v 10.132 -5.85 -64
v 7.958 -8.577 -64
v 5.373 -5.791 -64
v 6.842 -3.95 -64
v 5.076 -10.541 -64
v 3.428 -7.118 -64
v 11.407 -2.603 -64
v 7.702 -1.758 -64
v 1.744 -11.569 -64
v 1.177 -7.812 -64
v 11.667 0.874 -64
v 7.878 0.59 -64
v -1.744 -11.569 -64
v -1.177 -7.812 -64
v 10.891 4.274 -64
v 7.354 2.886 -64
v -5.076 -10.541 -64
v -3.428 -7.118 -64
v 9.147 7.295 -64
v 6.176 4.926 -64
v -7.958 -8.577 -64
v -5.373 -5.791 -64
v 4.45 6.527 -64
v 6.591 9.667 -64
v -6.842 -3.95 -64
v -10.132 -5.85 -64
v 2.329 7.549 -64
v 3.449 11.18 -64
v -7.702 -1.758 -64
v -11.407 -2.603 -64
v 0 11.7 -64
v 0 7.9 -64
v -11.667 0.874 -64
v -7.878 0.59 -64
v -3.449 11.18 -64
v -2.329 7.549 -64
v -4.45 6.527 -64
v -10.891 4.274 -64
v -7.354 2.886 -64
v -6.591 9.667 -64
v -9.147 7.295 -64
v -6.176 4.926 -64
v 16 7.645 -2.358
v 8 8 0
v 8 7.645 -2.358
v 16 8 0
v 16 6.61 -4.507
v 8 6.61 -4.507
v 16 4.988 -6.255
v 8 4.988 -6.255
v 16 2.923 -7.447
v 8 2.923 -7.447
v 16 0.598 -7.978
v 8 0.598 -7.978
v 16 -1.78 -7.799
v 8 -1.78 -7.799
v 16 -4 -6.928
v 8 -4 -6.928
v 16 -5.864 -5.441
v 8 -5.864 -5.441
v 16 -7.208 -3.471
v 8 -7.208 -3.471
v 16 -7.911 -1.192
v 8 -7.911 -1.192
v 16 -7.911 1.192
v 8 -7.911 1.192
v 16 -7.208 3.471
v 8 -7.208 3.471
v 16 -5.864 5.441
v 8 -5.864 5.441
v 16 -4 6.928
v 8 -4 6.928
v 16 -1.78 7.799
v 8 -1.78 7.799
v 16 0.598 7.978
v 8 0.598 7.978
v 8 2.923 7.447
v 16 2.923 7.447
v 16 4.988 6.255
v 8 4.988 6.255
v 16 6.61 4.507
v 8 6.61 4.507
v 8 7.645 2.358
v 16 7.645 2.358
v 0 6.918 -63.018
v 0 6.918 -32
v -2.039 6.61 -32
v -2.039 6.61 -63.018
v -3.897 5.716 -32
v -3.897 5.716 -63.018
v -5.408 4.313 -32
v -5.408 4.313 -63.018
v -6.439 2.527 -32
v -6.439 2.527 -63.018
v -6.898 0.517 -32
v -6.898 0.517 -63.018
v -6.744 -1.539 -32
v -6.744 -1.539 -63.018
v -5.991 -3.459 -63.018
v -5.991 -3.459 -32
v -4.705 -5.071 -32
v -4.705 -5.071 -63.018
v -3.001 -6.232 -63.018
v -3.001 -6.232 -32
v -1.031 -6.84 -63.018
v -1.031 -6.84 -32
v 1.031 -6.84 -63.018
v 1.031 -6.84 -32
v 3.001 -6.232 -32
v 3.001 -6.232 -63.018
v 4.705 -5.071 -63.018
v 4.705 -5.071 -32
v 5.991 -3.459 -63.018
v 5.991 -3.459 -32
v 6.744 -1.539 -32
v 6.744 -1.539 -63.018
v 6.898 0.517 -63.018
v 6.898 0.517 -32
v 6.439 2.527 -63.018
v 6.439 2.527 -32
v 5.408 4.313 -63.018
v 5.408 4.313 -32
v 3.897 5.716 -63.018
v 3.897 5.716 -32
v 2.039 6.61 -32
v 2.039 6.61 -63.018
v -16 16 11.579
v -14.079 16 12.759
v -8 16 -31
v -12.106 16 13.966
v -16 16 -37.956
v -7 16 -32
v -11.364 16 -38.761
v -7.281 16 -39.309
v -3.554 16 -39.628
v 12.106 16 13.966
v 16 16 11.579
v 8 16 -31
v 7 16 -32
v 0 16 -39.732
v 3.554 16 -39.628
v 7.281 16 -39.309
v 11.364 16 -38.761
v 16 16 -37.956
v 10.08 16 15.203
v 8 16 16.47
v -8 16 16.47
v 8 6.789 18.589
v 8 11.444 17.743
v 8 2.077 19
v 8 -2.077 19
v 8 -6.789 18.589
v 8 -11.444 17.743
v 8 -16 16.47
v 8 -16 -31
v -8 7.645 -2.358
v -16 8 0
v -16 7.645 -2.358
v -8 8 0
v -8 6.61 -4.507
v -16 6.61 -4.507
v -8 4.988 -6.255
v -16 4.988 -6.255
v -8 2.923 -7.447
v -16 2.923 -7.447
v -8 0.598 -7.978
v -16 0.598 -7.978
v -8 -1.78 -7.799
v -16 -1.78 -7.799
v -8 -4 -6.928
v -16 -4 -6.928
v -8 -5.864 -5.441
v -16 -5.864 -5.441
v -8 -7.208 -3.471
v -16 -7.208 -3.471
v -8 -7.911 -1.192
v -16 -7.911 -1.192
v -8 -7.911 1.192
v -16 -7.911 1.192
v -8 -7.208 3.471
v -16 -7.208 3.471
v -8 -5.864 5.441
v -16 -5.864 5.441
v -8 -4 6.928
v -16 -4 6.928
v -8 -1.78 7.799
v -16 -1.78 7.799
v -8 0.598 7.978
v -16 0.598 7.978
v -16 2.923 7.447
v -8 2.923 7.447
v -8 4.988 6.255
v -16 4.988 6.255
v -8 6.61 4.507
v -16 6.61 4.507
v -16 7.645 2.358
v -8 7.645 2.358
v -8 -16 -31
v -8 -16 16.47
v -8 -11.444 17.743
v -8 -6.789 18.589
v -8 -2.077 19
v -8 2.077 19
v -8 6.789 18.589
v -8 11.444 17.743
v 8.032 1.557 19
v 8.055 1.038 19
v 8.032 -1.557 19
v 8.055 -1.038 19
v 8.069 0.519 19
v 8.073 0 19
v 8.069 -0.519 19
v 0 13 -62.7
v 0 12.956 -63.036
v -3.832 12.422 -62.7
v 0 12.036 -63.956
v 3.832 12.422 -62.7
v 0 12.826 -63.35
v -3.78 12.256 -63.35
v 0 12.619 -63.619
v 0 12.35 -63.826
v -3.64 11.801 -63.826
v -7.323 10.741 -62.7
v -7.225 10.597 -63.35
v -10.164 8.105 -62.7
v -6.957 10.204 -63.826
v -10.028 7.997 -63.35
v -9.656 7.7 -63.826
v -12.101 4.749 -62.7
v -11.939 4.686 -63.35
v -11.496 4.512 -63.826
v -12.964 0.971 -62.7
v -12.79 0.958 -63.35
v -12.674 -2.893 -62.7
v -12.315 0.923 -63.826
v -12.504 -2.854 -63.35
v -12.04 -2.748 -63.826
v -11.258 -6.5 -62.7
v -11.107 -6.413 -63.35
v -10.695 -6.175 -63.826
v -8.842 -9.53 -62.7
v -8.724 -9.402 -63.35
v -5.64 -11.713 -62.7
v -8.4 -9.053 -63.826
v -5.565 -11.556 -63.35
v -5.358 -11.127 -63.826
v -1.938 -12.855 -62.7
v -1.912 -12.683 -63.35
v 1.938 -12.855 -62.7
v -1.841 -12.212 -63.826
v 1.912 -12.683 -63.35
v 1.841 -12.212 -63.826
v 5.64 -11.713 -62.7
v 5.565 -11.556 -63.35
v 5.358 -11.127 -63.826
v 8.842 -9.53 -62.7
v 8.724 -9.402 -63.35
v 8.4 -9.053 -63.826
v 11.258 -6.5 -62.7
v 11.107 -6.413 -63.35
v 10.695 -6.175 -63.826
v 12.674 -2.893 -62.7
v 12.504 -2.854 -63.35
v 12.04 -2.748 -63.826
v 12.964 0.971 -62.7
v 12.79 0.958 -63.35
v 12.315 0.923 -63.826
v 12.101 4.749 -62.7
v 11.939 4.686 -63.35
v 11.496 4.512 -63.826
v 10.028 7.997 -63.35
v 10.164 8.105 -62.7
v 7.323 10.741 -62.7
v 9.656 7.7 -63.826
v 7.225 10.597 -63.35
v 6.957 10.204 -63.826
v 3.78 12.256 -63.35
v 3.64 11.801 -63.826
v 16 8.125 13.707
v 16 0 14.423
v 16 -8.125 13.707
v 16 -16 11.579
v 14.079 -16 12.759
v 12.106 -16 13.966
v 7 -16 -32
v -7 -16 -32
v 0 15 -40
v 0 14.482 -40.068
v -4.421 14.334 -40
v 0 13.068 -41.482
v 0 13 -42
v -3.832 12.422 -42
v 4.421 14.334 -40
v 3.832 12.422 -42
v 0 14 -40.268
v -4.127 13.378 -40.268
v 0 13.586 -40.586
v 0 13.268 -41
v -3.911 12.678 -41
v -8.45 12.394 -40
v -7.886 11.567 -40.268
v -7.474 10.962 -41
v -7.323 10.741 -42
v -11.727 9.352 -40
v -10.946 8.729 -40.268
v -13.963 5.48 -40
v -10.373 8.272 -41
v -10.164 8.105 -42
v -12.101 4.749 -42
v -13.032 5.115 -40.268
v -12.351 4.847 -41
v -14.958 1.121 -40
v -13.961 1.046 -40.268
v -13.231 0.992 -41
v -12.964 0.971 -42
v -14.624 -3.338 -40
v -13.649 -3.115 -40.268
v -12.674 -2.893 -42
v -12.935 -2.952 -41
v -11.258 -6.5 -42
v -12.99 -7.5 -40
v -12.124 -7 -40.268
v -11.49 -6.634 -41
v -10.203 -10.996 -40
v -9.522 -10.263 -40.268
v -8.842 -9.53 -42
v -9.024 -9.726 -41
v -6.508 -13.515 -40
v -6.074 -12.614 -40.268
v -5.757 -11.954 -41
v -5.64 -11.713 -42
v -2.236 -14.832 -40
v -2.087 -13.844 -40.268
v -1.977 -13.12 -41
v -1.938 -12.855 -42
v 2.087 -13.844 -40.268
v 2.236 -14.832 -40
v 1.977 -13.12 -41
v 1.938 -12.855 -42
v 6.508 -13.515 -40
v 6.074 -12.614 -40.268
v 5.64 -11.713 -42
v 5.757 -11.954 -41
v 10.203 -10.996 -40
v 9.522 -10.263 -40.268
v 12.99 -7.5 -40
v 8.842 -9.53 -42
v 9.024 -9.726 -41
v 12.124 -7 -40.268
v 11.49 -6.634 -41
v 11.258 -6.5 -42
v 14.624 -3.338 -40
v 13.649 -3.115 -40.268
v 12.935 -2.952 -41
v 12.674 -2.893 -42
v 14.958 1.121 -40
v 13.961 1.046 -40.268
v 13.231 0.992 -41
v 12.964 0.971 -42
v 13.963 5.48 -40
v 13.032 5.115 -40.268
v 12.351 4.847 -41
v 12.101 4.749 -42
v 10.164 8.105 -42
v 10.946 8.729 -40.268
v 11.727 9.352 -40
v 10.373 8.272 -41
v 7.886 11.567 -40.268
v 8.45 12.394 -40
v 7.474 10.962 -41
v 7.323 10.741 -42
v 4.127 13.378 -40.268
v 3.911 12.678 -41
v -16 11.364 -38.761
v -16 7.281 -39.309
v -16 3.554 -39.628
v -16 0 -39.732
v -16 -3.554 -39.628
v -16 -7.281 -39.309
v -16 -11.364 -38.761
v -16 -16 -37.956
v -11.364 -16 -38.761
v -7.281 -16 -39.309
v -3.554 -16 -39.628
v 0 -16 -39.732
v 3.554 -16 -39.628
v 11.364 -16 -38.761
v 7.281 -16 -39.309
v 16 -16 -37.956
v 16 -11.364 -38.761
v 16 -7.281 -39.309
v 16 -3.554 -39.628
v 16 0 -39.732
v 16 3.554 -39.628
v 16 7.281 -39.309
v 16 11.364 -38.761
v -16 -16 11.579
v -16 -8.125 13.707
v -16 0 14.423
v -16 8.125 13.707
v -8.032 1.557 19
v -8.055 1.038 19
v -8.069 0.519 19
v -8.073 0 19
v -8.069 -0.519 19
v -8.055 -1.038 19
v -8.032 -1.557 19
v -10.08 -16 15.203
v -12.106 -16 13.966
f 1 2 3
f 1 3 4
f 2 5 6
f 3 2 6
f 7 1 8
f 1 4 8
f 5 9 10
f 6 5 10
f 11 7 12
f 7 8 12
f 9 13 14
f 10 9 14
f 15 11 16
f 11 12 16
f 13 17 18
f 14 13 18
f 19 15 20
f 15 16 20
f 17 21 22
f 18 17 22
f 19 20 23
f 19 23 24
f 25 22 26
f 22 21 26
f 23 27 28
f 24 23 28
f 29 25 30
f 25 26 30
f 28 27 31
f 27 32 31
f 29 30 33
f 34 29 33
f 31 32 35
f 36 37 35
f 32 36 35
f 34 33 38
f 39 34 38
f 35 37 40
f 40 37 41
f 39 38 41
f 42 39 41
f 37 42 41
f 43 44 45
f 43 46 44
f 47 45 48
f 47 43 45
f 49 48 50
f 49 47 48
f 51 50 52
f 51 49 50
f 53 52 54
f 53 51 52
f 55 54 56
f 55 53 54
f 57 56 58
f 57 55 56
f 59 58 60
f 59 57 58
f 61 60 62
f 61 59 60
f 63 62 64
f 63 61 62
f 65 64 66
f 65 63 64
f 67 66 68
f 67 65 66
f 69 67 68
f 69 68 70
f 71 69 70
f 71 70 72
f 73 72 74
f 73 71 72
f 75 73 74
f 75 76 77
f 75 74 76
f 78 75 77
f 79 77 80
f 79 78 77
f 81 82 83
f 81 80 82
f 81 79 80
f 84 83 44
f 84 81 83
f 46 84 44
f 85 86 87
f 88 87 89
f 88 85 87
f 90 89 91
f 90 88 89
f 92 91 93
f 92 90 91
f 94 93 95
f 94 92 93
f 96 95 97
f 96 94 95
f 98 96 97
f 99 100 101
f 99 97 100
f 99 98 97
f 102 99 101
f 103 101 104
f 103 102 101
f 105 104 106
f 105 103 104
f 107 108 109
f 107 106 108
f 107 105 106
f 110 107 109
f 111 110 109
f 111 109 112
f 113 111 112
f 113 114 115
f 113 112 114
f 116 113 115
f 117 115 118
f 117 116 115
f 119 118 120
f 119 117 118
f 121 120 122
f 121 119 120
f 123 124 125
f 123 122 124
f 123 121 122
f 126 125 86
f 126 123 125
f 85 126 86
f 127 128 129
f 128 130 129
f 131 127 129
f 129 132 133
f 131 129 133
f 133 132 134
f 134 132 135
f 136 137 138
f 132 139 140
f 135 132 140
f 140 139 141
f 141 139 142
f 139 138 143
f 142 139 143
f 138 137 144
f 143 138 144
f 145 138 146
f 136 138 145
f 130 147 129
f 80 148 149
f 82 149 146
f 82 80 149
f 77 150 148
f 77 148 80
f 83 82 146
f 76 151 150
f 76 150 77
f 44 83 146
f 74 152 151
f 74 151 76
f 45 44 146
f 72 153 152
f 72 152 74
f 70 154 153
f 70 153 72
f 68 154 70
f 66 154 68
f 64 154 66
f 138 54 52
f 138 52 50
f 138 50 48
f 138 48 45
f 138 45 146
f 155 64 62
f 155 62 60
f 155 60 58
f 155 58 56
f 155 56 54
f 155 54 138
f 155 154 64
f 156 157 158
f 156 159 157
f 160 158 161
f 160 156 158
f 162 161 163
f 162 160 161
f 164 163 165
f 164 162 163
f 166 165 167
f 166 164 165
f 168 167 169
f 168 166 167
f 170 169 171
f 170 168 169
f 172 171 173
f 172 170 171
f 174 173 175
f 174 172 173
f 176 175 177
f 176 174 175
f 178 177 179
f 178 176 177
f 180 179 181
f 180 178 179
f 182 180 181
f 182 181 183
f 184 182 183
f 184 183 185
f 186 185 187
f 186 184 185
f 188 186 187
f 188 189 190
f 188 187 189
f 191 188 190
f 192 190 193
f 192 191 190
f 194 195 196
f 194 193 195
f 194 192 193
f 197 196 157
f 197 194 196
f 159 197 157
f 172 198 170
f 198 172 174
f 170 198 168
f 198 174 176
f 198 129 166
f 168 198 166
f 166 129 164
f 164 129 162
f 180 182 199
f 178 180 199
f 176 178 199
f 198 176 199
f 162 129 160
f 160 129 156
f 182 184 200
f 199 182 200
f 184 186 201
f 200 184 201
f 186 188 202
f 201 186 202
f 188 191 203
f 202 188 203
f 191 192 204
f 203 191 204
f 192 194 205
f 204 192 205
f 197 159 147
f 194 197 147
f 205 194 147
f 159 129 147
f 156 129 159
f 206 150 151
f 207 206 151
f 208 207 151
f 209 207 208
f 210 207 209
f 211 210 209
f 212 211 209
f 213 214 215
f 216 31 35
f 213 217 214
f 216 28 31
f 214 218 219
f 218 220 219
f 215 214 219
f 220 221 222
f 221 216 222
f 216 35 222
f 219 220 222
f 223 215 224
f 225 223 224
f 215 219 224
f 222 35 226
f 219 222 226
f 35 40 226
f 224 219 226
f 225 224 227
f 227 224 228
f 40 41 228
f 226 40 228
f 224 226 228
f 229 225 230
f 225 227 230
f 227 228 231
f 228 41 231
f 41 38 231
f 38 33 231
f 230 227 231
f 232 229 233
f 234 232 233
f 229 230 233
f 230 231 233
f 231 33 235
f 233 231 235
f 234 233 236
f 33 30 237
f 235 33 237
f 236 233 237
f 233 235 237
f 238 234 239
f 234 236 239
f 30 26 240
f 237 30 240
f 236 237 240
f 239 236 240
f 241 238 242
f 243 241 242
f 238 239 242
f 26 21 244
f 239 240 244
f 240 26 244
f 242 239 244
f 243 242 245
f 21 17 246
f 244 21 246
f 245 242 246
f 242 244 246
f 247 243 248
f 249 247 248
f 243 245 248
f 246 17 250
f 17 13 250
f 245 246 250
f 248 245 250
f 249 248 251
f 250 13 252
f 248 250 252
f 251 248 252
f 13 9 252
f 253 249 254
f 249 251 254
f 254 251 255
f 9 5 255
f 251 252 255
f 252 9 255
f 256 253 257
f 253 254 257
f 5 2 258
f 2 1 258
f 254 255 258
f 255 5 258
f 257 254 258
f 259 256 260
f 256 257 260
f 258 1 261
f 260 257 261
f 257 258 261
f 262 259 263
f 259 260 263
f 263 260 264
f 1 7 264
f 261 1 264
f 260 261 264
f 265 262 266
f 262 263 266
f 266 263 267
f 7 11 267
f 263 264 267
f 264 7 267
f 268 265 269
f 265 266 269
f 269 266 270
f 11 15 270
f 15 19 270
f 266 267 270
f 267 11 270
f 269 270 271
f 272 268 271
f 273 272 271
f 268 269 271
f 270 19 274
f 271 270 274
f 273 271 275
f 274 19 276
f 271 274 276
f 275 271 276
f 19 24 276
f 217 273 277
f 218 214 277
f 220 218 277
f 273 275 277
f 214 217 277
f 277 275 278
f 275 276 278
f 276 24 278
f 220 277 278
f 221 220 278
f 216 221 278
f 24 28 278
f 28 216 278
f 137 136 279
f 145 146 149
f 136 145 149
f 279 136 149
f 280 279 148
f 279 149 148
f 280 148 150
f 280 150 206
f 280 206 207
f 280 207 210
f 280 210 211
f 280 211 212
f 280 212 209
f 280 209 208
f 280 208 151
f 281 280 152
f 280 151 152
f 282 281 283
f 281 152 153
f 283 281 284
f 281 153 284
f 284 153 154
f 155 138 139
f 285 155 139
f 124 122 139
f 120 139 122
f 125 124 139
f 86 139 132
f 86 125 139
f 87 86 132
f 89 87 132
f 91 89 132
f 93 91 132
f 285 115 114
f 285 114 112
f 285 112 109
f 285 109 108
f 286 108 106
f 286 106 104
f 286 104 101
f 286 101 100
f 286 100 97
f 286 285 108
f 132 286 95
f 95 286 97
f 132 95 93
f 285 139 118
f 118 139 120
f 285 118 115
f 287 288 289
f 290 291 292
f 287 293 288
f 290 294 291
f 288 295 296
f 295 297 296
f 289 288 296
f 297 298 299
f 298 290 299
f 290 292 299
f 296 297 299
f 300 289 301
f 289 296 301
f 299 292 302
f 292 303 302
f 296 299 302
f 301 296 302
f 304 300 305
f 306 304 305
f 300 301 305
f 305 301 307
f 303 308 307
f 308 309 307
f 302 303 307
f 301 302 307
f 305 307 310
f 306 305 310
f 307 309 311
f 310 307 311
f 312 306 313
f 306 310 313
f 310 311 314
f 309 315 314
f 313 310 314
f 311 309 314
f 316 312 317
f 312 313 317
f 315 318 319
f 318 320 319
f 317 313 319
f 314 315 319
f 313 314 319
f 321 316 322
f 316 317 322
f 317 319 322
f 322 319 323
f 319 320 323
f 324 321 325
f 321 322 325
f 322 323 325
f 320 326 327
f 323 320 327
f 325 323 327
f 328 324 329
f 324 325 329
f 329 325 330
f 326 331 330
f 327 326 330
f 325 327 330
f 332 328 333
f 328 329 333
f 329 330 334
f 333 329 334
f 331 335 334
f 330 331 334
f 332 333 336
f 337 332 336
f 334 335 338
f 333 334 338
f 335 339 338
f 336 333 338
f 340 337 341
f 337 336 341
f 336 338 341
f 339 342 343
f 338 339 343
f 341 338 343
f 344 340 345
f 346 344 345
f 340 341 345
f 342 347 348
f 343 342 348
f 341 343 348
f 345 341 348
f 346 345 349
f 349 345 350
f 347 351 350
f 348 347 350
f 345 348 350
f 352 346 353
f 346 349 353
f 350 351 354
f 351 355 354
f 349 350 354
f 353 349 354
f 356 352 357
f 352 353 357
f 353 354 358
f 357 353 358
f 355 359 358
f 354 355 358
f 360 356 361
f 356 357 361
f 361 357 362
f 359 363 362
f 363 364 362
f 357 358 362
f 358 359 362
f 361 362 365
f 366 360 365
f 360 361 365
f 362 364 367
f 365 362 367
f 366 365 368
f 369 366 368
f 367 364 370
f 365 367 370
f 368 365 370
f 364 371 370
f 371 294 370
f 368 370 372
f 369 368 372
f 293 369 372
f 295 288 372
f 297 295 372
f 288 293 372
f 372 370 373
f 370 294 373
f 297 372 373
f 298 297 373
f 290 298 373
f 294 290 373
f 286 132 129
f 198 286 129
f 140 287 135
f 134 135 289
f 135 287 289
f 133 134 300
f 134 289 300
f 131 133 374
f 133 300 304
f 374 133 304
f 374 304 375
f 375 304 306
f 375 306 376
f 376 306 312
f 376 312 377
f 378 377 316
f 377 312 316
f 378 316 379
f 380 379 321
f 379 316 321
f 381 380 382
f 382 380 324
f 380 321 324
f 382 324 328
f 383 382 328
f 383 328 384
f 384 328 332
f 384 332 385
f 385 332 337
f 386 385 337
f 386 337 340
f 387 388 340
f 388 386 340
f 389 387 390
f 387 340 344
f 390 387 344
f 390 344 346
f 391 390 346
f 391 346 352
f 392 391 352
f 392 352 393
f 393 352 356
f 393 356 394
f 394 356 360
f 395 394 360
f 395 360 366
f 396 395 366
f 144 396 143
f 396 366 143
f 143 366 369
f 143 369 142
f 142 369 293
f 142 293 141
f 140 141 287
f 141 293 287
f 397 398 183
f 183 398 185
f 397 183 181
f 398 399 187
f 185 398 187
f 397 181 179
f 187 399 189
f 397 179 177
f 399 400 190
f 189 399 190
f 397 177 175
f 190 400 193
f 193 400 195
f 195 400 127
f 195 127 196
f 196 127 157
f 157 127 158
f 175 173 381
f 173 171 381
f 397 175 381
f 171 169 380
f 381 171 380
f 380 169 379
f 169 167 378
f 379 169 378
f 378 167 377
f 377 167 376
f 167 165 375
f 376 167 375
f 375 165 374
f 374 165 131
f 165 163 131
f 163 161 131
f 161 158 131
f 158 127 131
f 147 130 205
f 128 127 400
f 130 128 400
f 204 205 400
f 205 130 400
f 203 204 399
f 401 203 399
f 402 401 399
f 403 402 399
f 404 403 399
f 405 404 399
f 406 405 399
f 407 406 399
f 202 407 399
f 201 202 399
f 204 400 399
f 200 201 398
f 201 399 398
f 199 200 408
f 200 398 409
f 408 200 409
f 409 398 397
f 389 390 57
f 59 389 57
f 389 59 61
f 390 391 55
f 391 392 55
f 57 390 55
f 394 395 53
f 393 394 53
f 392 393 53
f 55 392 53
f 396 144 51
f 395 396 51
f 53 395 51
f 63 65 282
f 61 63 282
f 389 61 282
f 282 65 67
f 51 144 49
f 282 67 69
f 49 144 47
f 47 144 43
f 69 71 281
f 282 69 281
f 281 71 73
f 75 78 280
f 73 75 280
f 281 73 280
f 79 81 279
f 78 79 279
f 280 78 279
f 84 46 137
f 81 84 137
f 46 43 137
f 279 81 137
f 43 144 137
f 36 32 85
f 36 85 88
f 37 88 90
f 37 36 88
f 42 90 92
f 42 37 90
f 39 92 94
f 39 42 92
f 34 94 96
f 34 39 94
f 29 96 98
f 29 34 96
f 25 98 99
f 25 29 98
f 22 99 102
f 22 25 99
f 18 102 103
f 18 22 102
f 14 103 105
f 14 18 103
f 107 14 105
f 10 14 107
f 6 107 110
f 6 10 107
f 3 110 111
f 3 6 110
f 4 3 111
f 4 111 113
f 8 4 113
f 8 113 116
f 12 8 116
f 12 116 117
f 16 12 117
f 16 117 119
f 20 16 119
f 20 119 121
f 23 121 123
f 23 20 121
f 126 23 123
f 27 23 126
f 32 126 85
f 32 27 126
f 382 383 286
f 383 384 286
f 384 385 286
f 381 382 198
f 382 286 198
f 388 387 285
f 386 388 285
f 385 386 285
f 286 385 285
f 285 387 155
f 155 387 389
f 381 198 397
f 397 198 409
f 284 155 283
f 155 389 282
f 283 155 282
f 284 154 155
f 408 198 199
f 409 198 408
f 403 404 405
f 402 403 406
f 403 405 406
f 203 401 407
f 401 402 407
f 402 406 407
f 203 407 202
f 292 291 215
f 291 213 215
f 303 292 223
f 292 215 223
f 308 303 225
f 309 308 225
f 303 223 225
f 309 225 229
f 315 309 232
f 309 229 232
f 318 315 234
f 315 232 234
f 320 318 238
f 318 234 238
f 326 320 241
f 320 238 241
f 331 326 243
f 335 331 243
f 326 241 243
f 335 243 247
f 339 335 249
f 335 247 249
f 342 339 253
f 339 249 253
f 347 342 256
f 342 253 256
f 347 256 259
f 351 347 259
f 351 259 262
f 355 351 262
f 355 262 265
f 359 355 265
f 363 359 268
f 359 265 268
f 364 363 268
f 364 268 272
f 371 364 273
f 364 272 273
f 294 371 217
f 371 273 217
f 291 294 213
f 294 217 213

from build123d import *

# Parameters (mm, degrees)
CUT_EXTRUDE1_DEPTH           = 33
CUT_EXTRUDE1_DEPTH_BACK      = 33
CUT_EXTRUDE2_DEPTH           = 33
CUT_EXTRUDE2_DEPTH_BACK      = 33
CUT_EXTRUDE3_DEPTH           = 33
CUT_EXTRUDE3_DEPTH_BACK      = 33
SKETCH5_W                    = 39.5
SKETCH5_H                    = 8
CUT_REVOLVE3_ANGLE           = 90
CUT_REVOLVE3_OTHER_WAY_ANGLE = 90


with BuildPart() as part:
    # Sketch1 → Revolve1 (revolve)
    with BuildSketch(Plane(origin=(0, 0, 0), x_dir=(0, 0, -1), z_dir=(1, 0, 0))):
        with BuildLine():
            Line((-19, 0), (-19, 32))
            Line((-19, 32), (35.444863729, 32))
            Line((35.444863729, 32), (40, 15))
            ThreePointArc((40, 15), (40.585786438, 13.585786438), (42, 13))
            Line((42, 13), (62.7, 13))
            ThreePointArc((62.7, 13), (63.619238816, 12.619238816), (64, 11.7))
            Line((64, 11.7), (64, 0))
            Line((64, 0), (-19, 0))
        make_face()
    revolve(axis=Axis((0, 0, -64), (0, 0, 1)))

    # Sketch2 → Cut-Extrude1 (cut, two sides: drawn at the far end of the back side and taken through both)
    with BuildSketch(Plane(origin=(0, 0, 0), x_dir=(1, 0, 0), z_dir=(0, 1, 0)).offset(-CUT_EXTRUDE1_DEPTH_BACK)):
        Polygon((-8, 31), (-8, -20), (8, -20), (8, 31), (7, 32), (-7, 32), align=None)
    extrude(amount=CUT_EXTRUDE1_DEPTH + CUT_EXTRUDE1_DEPTH_BACK, mode=Mode.SUBTRACT)

    # Sketch3 → Cut-Extrude2 (cut, two sides: drawn at the far end of the back side and taken through both)
    with BuildSketch(Plane(origin=(0, 0, 0), x_dir=(0, 0, -1), z_dir=(1, 0, 0)).offset(-CUT_EXTRUDE2_DEPTH_BACK)):
        Polygon((-52, -48), (64, -48), (64, -16), (-20, -16), (-20, 16), (64, 16), (64, 48), (-52, 48), align=None)
    extrude(amount=CUT_EXTRUDE2_DEPTH + CUT_EXTRUDE2_DEPTH_BACK, mode=Mode.SUBTRACT)

    # Sketch4 → Cut-Extrude3 (cut, two sides: drawn at the far end of the back side and taken through both)
    with BuildSketch(Plane(origin=(0, 0, 0), x_dir=(1, 0, 0), z_dir=(0, 1, 0)).offset(-CUT_EXTRUDE3_DEPTH_BACK)):
        Polygon((-48, -52), (48, -52), (48, 64), (16, 64), (16, -20), (-16, -20), (-16, 64), (-48, 64), align=None)
    extrude(amount=CUT_EXTRUDE3_DEPTH + CUT_EXTRUDE3_DEPTH_BACK, mode=Mode.SUBTRACT)

    # Sketch5 → Cut-Revolve1 (revolve, cut)
    with BuildSketch(Plane.XY):
        with Locations((0, 4)):
            Rectangle(SKETCH5_W, SKETCH5_H)
    revolve(axis=Axis((19.75, 0, 0), (-1, 0, 0)), mode=Mode.SUBTRACT)

    # Sketch6 → Cut-Revolve2 (revolve, cut)
    with BuildSketch(Plane(origin=(0, 0, 0), x_dir=(0, 0, -1), z_dir=(1, 0, 0))):
        Polygon((30.9, 0), (30.9, 6.9175), (63.0175, 6.9175), (64.1, 8), (64.1, 0), align=None)
    revolve(axis=Axis((0, 0, -64.1), (0, 0, 1)), mode=Mode.SUBTRACT)

    # Sketch7 → Cut-Revolve3 (revolve, cut)
    with BuildSketch(Plane(origin=(0, 0, 0), x_dir=(1, 0, 0), z_dir=(0, 1, 0))):
        Polygon((-19, -49.64182924), (0, -60.611484355), (19, -49.64182924), (19, -12.691412012), (0, -23.661067127), (-19, -12.691412012), align=None)
    revolve(axis=Axis((-19, 0, -32), (-1, 0, 0)), revolution_arc=CUT_REVOLVE3_ANGLE, mode=Mode.SUBTRACT)

    # Sketch7 → Cut-Revolve3 other way (revolve, cut)
    with BuildSketch(Plane(origin=(0, 0, 0), x_dir=(1, 0, 0), z_dir=(0, 1, 0))):
        Polygon((-19, -49.64182924), (0, -60.611484355), (19, -49.64182924), (19, -12.691412012), (0, -23.661067127), (-19, -12.691412012), align=None)
    revolve(axis=Axis((-19, 0, -32), (1, 0, 0)), revolution_arc=CUT_REVOLVE3_OTHER_WAY_ANGLE, mode=Mode.SUBTRACT)


solid = part.part
